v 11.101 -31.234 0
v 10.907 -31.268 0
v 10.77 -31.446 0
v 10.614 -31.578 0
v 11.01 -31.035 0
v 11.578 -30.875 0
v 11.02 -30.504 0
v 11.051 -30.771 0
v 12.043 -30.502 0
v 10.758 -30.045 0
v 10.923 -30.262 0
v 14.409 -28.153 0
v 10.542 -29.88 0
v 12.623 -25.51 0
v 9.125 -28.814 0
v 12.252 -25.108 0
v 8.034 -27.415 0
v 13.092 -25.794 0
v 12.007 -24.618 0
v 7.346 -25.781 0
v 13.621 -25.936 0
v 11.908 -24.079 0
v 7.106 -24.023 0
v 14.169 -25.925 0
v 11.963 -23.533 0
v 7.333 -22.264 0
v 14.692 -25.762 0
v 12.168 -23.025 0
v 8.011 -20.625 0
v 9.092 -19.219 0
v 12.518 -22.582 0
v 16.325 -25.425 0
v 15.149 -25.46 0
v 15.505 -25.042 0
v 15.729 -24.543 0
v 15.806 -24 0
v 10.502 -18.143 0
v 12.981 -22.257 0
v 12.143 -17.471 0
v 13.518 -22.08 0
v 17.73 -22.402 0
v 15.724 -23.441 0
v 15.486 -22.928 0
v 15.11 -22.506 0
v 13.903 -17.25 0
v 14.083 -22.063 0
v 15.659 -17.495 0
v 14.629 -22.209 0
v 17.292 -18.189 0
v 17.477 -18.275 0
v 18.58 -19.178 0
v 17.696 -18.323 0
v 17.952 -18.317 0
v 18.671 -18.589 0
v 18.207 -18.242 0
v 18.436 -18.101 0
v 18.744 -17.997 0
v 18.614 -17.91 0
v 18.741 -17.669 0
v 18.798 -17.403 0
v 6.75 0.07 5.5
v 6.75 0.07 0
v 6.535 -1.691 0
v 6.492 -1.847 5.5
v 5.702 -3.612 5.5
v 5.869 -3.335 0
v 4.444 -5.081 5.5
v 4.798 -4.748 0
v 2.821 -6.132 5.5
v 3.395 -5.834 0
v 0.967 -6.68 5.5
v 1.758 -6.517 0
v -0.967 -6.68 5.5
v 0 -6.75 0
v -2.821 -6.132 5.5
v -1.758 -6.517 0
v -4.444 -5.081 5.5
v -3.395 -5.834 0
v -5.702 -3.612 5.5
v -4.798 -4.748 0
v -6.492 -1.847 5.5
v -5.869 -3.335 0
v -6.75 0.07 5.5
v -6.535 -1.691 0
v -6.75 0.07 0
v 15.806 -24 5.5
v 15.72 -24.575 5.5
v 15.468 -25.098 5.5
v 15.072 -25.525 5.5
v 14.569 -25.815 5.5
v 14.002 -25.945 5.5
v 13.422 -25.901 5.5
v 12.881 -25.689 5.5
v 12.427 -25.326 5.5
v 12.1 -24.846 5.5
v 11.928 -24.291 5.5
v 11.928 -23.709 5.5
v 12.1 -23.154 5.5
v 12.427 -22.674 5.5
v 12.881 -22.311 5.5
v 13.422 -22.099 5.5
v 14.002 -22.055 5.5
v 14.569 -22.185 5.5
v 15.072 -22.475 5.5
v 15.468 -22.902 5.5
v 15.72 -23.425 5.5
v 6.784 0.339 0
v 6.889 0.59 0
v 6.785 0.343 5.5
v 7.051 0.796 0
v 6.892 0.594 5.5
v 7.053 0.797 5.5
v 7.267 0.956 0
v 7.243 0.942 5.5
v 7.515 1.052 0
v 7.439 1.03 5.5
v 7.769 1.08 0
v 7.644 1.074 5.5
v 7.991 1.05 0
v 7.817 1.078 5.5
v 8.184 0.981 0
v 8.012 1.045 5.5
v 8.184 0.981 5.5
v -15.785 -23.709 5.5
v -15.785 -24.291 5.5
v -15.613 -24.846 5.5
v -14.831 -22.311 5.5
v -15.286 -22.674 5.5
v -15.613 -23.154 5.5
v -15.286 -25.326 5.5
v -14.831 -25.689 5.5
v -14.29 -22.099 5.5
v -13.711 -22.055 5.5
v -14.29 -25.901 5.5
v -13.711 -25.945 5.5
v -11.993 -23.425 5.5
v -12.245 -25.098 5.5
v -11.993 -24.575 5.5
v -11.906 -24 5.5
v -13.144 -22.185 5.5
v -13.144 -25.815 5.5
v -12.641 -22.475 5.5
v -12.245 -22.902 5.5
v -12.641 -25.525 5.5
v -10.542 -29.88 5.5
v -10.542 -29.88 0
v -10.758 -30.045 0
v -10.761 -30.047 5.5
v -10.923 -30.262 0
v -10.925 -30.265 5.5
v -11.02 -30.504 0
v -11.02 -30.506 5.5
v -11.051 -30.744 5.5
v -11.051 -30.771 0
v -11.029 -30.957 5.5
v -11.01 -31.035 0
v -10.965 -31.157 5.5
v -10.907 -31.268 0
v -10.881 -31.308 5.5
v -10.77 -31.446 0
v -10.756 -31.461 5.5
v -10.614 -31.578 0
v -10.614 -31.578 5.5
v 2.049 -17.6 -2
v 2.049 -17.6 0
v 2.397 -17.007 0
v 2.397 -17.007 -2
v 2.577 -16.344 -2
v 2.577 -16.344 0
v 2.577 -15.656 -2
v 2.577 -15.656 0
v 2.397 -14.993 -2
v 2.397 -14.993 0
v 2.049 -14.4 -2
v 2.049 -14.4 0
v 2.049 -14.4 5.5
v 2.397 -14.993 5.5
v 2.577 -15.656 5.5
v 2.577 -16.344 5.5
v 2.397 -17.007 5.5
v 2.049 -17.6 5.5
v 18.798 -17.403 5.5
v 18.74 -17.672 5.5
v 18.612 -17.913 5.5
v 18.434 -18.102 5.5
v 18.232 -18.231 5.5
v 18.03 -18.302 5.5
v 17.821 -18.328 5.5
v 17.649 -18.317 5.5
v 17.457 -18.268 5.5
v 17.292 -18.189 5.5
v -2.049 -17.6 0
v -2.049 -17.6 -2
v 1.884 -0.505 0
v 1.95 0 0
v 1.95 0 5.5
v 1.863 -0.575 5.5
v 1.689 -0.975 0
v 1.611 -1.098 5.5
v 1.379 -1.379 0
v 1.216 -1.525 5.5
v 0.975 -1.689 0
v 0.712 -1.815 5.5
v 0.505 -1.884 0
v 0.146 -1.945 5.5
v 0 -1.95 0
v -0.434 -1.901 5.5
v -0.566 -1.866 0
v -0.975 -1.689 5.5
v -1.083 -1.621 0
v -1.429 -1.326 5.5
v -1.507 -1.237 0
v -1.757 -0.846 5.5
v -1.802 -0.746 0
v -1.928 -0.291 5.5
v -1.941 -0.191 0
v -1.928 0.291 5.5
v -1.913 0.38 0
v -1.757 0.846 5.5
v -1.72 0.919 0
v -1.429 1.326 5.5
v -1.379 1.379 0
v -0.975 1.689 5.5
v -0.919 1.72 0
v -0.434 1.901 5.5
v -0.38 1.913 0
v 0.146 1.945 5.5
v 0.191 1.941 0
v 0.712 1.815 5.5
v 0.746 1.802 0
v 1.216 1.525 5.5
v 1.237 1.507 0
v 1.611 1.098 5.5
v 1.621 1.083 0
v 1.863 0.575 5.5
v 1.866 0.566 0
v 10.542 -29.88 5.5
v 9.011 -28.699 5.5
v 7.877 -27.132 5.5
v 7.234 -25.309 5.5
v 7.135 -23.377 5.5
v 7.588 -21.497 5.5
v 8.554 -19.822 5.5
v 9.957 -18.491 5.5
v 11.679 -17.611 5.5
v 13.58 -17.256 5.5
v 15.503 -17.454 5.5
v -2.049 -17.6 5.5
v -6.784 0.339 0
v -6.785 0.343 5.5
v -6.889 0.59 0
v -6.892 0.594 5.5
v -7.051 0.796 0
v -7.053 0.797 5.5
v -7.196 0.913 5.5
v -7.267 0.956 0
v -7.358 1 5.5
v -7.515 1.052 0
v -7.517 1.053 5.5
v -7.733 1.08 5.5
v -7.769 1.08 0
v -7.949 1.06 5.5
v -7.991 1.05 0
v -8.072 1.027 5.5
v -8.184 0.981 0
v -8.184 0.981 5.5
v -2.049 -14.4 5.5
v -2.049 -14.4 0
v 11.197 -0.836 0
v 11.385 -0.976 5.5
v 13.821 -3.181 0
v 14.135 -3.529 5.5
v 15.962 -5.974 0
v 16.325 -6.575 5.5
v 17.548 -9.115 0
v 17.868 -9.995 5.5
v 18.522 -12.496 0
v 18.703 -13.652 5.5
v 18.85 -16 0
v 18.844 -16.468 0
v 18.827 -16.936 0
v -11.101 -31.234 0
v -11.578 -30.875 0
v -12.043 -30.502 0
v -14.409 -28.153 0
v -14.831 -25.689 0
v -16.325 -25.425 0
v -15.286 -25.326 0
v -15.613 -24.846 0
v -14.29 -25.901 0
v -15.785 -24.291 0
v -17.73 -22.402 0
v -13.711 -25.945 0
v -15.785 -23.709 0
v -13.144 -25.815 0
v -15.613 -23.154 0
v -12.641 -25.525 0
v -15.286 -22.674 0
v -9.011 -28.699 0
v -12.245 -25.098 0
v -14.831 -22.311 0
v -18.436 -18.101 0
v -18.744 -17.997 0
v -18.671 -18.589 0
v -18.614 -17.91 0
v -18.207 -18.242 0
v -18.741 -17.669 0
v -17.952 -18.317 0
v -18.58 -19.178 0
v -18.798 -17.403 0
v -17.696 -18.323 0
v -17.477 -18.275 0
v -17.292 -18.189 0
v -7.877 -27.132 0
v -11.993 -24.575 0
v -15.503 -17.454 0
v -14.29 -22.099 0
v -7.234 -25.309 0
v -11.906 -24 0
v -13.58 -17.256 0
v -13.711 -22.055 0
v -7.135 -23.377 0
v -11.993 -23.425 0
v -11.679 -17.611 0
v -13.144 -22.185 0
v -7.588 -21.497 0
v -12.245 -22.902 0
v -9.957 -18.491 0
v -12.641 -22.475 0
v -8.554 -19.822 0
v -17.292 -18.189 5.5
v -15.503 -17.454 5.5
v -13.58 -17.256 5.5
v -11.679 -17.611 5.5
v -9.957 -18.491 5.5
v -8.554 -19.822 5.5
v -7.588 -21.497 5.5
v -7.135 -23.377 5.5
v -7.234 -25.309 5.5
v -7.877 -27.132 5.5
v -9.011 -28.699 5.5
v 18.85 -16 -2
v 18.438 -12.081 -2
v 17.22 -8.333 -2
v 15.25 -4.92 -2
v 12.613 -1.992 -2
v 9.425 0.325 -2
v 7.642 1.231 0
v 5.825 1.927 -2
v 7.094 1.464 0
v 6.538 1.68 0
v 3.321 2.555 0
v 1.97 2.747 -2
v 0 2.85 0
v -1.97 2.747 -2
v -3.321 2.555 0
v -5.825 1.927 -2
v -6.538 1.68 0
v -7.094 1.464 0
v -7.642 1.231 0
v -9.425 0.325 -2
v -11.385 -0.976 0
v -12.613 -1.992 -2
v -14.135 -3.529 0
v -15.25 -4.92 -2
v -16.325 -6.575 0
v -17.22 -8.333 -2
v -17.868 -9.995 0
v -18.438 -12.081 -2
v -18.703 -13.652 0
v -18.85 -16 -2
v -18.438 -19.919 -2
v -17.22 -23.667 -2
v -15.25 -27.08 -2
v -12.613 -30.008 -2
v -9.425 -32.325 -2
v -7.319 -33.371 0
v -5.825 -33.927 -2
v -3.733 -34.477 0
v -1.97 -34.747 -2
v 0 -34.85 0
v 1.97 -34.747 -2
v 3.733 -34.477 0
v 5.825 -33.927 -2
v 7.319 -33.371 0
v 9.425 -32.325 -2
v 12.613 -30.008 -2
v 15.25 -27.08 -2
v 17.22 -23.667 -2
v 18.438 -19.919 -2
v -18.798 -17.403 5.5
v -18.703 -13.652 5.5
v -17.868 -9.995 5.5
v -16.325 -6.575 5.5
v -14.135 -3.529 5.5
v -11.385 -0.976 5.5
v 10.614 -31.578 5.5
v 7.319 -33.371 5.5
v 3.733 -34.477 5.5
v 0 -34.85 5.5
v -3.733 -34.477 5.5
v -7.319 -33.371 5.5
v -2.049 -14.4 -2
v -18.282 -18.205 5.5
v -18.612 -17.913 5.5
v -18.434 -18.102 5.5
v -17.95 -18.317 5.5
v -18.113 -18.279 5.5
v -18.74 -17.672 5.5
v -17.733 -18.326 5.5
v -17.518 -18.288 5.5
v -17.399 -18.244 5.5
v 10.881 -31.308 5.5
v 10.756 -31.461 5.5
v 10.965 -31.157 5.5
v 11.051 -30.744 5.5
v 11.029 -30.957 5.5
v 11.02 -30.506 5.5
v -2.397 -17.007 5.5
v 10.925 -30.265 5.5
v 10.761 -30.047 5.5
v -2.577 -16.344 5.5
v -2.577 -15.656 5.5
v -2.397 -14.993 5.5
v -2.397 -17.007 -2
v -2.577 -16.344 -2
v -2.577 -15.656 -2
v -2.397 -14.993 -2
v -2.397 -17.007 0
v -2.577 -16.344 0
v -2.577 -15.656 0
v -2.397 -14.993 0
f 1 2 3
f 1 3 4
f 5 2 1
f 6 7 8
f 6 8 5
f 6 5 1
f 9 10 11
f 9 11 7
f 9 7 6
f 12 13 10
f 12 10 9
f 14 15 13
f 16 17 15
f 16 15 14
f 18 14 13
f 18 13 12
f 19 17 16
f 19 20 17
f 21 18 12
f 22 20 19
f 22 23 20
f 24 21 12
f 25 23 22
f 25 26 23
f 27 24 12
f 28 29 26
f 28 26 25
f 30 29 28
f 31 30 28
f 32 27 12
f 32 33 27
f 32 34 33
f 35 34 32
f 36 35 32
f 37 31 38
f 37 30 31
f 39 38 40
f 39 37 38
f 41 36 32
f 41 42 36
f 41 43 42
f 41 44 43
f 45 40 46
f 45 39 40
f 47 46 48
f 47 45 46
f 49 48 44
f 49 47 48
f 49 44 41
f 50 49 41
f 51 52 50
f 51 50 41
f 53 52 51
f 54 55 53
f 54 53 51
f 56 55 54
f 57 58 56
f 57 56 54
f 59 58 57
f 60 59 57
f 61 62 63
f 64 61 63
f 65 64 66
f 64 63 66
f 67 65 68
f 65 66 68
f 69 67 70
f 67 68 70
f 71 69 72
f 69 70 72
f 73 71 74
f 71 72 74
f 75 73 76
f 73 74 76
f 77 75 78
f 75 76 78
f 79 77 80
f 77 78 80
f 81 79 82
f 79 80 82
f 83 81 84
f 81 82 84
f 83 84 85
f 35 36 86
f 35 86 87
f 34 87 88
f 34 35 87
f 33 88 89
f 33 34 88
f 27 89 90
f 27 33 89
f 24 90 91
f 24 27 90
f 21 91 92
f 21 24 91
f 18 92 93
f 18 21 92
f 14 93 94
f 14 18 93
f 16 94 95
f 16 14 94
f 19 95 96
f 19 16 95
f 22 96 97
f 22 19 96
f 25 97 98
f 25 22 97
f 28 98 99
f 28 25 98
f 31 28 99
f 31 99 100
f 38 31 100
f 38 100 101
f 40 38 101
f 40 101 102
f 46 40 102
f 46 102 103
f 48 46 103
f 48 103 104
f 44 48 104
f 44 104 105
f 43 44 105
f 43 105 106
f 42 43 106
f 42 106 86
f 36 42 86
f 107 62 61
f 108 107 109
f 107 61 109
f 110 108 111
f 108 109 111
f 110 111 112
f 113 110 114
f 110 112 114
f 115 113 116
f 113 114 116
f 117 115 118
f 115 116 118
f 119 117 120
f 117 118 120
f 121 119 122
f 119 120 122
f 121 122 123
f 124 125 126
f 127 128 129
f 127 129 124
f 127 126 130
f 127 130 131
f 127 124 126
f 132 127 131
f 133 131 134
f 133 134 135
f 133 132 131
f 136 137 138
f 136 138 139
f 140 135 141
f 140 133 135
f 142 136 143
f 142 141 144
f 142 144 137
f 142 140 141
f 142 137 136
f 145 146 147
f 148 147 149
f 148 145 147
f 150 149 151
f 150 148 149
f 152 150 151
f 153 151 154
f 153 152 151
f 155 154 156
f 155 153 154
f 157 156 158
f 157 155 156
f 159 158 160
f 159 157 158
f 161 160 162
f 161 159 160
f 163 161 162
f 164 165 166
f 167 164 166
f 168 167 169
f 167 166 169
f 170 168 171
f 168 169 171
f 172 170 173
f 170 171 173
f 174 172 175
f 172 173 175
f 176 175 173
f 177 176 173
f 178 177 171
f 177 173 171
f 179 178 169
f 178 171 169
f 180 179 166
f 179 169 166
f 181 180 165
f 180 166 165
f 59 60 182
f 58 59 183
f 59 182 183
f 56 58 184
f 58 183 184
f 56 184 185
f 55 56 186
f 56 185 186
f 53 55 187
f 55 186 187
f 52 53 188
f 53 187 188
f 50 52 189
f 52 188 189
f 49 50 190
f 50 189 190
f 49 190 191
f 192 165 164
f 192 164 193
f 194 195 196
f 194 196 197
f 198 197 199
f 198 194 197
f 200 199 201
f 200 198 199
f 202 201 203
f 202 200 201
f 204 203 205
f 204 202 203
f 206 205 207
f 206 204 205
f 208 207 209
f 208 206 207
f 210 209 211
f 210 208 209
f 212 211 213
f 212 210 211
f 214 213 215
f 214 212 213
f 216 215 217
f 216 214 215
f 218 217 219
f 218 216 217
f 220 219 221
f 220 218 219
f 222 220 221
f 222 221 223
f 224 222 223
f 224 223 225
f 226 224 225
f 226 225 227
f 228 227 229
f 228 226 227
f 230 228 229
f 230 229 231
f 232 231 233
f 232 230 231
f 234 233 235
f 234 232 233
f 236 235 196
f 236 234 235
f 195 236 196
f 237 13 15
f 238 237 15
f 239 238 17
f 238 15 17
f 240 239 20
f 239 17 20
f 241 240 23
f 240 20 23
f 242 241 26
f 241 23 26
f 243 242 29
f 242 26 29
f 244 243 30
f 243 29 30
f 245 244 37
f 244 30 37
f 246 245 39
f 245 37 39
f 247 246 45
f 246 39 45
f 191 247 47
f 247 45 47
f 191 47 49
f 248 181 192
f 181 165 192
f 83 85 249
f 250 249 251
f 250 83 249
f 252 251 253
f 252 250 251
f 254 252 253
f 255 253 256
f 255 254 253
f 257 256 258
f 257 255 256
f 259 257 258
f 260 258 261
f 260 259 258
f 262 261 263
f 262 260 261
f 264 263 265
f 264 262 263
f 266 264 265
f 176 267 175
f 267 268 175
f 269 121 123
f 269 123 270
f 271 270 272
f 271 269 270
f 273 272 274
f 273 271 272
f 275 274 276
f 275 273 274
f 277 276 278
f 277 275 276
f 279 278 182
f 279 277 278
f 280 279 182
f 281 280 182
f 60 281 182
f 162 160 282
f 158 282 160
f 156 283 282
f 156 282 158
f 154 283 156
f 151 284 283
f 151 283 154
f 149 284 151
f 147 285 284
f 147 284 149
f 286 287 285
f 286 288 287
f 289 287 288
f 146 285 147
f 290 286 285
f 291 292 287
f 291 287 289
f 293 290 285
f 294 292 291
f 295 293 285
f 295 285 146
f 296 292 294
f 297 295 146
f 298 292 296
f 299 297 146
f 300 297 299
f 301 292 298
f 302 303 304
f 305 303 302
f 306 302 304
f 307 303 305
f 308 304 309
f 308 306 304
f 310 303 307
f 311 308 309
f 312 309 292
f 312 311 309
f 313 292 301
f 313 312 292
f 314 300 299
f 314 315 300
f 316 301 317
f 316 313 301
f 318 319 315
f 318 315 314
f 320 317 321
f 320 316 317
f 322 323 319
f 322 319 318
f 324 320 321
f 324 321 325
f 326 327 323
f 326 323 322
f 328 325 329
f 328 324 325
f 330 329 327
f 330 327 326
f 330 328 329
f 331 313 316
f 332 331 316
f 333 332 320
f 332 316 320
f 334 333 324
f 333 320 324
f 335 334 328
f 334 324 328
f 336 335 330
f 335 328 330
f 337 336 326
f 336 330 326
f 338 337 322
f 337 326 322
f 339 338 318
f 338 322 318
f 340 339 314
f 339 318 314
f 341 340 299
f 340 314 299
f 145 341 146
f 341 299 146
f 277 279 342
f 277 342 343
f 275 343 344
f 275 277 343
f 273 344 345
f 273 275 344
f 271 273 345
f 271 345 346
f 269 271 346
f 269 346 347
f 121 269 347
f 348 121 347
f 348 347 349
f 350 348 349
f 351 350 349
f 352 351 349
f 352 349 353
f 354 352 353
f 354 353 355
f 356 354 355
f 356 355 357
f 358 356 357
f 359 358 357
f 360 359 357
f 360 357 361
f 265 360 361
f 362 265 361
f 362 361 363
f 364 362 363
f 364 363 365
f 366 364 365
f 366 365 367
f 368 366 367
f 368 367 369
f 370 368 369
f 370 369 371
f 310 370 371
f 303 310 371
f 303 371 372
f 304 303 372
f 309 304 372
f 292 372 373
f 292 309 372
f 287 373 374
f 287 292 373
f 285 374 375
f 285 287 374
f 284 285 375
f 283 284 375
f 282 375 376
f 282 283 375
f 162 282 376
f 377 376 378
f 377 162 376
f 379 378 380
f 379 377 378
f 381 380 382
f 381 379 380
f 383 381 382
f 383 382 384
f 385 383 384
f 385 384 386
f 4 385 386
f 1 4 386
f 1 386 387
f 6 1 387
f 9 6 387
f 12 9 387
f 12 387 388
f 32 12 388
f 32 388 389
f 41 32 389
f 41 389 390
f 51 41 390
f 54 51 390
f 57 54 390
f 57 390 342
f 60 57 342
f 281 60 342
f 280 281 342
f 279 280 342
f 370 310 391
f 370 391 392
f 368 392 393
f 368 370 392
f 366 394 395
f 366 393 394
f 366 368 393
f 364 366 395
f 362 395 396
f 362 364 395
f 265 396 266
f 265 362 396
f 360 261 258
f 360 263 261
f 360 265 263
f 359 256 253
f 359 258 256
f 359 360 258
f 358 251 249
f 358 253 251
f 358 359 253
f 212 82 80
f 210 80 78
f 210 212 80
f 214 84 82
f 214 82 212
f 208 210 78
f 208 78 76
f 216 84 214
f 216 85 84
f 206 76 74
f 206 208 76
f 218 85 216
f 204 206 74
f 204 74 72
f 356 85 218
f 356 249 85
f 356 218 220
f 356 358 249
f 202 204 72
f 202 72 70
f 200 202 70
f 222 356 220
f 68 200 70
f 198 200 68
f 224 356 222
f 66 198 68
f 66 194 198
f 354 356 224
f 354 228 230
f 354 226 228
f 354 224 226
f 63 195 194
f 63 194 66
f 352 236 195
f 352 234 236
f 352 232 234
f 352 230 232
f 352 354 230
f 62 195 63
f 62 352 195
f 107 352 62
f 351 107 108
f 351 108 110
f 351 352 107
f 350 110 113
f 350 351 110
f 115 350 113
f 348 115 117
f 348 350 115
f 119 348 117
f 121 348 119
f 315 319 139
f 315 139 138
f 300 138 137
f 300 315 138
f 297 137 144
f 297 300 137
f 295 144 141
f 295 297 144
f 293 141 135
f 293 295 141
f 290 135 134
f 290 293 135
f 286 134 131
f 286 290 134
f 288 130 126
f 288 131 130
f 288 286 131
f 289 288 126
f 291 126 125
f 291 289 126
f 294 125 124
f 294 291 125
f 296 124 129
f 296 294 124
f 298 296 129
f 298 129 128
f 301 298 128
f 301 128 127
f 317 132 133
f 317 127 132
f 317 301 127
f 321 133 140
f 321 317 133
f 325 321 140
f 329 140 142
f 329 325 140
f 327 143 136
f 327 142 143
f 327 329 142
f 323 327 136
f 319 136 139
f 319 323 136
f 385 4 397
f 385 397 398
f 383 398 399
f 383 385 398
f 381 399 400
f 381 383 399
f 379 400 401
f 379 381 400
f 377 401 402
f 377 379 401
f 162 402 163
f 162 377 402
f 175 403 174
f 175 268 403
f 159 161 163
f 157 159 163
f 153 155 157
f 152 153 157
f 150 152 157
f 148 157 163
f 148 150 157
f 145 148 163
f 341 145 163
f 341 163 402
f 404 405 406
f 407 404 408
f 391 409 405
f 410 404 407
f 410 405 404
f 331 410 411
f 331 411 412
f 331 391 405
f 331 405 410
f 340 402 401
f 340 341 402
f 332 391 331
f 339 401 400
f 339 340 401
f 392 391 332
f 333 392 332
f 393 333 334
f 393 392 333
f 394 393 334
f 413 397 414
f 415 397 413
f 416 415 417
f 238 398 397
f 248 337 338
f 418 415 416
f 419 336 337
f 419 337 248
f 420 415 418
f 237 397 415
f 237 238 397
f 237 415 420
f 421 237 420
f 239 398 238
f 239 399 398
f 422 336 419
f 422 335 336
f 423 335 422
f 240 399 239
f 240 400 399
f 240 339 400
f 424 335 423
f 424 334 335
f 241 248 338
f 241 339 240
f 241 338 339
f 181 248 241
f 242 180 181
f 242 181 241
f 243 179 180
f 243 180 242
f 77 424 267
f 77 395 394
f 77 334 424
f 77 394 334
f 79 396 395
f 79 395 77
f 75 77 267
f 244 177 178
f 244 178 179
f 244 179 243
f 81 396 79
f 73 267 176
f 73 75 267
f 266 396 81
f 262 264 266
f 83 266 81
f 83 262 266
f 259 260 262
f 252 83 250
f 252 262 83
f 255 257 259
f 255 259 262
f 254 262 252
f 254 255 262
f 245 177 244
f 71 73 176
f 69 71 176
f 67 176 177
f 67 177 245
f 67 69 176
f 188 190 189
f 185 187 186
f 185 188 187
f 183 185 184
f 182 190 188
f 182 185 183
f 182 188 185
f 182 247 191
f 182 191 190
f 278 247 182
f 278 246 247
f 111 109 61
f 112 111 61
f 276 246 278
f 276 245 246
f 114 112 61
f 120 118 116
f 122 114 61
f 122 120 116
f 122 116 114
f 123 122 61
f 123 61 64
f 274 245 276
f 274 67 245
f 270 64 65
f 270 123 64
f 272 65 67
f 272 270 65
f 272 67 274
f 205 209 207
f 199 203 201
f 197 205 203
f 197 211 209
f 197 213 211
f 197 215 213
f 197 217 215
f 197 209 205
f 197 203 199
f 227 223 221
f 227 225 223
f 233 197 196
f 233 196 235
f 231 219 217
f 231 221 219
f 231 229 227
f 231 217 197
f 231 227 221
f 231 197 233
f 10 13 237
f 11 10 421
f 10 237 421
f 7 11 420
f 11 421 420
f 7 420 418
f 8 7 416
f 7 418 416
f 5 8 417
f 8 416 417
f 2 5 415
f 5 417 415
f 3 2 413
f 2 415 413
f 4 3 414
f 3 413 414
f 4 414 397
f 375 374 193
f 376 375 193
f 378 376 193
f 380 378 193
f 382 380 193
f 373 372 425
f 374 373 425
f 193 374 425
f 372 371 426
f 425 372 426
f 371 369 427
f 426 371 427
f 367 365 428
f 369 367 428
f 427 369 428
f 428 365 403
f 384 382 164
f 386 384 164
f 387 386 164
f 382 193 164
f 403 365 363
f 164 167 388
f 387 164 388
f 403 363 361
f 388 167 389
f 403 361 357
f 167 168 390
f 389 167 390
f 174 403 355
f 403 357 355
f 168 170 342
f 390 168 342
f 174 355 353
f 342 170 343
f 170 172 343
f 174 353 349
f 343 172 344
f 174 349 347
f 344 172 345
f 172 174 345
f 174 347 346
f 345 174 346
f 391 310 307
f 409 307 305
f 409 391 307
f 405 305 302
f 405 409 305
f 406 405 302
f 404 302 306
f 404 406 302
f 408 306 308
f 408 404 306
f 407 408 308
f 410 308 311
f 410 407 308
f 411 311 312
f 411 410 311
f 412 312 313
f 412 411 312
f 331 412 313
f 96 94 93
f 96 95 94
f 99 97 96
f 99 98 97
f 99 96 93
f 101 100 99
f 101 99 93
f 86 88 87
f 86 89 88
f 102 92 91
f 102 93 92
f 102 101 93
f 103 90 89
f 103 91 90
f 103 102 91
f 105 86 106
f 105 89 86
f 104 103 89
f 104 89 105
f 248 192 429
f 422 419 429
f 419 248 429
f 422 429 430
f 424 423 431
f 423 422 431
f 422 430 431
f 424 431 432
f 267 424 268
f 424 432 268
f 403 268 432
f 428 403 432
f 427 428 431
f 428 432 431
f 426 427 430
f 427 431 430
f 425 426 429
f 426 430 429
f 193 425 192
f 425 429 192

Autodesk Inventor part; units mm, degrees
ref_plane "YZ Plane" through (0, 0, 0) normal (1, 0, 0) x (0, 1, 0)
ref_plane "XZ Plane" through (0, 0, 0) normal (0, 1, 0) x (-1, 0, 0)
ref_plane "XY Plane" through (0, 0, 0) normal (0, 0, 1) x (1, 0, 0)
sketch "Sketch1" plane through (0, 0, 0) normal (0, 0, 1) x (1, 0, 0)
  circle A0 centre (0, 0) radius 6.75
  circle A1 centre (0, 0) radius 1.95
  line L0 (0, 0) -> (0, -16)
  circle A2 centre (-13.8564, -24) radius 6.75
  circle A3 centre (-13.8564, -24) radius 1.95
  line L1 (-13.8564, -24) -> (0, -16) construction
  circle A4 centre (13.8564, -24) radius 6.75
  circle A5 centre (13.8564, -24) radius 1.95
  line L2 (13.8564, -24) -> (0, -16)
  circle A6 centre (0, -16) radius 18.85
  circle A7 centre (0, -16) radius 1.05 construction
  circle A8 centre (0, -16) radius 2.6
  line L3 (-2.7713, -14.4) -> (2.7713, -14.4)
  line L4 (2.7713, -14.4) -> (2.7713, -17.6)
  line L5 (2.7713, -17.6) -> (-2.7713, -17.6)
  line L6 (-2.7713, -17.6) -> (-2.7713, -14.4)
  line L7 (-2.7713, -14.4) -> (2.7713, -17.6) construction
  line L8 (2.7713, -14.4) -> (-2.7713, -17.6) construction
  point P0 (18.5801, -19.1783)
  point P1 (6.5376, 1.68)
  point P2 (-6.5376, 1.68)
  point P3 (-18.5801, -19.1783)
  point P4 (-12.0425, -30.5017)
  point P5 (12.0425, -30.5017)
  point P6 (-2.0494, -17.6)
  point P7 (-2.0494, -14.4)
  point P8 (2.0494, -14.4)
  point P9 (2.0494, -17.6)
  dimension "d0" = 13.5
  dimension "d1" = 3.9
  dimension "d2" = 16
  dimension "d5" = 360
  dimension "d12" = 2.1
  dimension "d14" = 37.7
  dimension "d15" = 5.2
  dimension "d21" = 3.2
extrude "Extrusion1" add sketch "Sketch1" along normal blind 5.5 contours A1 | A0 A6 A4 L2 L4 L3 A8 L0 | L0 A8 L3 L6 L5 L2 A4 A6 A2 A0 | A8 L3 L0 | L0 L3 A8 | A5 | L3 L4 L2 A8 | A8 L5 L6 L3 | L5 A8 | L5 A8 L2 | A3
extrude "Extrusion2" add sketch "Sketch1" against normal blind 2 contours A1 | A0 A6 | A0 A6 A4 L2 L4 L3 A8 L0 | L0 A8 L3 L6 L5 L2 A4 A6 A2 A0 | A8 L3 L0 | L0 L3 A8 | A2 A6 | A5 | A6 A4 | L3 L4 L2 A8 | A8 L5 L6 L3 | L5 A8 | L5 A8 L2 | A3 picked at (3.5494, 1.6258) picked at (-17.0724, -21.7739) picked at (17.0771, -21.7793)
fillet "Fillet1" radius 1 6 edges at (-12.0425, -30.5017, 2.75) (-18.5801, -19.1783, 2.75) (18.5801, -19.1783, 2.75) (12.0425, -30.5017, 2.75) (6.5376, 1.68, 2.75) (-6.5376, 1.68, 2.75)
properties part number "gewindeding"
